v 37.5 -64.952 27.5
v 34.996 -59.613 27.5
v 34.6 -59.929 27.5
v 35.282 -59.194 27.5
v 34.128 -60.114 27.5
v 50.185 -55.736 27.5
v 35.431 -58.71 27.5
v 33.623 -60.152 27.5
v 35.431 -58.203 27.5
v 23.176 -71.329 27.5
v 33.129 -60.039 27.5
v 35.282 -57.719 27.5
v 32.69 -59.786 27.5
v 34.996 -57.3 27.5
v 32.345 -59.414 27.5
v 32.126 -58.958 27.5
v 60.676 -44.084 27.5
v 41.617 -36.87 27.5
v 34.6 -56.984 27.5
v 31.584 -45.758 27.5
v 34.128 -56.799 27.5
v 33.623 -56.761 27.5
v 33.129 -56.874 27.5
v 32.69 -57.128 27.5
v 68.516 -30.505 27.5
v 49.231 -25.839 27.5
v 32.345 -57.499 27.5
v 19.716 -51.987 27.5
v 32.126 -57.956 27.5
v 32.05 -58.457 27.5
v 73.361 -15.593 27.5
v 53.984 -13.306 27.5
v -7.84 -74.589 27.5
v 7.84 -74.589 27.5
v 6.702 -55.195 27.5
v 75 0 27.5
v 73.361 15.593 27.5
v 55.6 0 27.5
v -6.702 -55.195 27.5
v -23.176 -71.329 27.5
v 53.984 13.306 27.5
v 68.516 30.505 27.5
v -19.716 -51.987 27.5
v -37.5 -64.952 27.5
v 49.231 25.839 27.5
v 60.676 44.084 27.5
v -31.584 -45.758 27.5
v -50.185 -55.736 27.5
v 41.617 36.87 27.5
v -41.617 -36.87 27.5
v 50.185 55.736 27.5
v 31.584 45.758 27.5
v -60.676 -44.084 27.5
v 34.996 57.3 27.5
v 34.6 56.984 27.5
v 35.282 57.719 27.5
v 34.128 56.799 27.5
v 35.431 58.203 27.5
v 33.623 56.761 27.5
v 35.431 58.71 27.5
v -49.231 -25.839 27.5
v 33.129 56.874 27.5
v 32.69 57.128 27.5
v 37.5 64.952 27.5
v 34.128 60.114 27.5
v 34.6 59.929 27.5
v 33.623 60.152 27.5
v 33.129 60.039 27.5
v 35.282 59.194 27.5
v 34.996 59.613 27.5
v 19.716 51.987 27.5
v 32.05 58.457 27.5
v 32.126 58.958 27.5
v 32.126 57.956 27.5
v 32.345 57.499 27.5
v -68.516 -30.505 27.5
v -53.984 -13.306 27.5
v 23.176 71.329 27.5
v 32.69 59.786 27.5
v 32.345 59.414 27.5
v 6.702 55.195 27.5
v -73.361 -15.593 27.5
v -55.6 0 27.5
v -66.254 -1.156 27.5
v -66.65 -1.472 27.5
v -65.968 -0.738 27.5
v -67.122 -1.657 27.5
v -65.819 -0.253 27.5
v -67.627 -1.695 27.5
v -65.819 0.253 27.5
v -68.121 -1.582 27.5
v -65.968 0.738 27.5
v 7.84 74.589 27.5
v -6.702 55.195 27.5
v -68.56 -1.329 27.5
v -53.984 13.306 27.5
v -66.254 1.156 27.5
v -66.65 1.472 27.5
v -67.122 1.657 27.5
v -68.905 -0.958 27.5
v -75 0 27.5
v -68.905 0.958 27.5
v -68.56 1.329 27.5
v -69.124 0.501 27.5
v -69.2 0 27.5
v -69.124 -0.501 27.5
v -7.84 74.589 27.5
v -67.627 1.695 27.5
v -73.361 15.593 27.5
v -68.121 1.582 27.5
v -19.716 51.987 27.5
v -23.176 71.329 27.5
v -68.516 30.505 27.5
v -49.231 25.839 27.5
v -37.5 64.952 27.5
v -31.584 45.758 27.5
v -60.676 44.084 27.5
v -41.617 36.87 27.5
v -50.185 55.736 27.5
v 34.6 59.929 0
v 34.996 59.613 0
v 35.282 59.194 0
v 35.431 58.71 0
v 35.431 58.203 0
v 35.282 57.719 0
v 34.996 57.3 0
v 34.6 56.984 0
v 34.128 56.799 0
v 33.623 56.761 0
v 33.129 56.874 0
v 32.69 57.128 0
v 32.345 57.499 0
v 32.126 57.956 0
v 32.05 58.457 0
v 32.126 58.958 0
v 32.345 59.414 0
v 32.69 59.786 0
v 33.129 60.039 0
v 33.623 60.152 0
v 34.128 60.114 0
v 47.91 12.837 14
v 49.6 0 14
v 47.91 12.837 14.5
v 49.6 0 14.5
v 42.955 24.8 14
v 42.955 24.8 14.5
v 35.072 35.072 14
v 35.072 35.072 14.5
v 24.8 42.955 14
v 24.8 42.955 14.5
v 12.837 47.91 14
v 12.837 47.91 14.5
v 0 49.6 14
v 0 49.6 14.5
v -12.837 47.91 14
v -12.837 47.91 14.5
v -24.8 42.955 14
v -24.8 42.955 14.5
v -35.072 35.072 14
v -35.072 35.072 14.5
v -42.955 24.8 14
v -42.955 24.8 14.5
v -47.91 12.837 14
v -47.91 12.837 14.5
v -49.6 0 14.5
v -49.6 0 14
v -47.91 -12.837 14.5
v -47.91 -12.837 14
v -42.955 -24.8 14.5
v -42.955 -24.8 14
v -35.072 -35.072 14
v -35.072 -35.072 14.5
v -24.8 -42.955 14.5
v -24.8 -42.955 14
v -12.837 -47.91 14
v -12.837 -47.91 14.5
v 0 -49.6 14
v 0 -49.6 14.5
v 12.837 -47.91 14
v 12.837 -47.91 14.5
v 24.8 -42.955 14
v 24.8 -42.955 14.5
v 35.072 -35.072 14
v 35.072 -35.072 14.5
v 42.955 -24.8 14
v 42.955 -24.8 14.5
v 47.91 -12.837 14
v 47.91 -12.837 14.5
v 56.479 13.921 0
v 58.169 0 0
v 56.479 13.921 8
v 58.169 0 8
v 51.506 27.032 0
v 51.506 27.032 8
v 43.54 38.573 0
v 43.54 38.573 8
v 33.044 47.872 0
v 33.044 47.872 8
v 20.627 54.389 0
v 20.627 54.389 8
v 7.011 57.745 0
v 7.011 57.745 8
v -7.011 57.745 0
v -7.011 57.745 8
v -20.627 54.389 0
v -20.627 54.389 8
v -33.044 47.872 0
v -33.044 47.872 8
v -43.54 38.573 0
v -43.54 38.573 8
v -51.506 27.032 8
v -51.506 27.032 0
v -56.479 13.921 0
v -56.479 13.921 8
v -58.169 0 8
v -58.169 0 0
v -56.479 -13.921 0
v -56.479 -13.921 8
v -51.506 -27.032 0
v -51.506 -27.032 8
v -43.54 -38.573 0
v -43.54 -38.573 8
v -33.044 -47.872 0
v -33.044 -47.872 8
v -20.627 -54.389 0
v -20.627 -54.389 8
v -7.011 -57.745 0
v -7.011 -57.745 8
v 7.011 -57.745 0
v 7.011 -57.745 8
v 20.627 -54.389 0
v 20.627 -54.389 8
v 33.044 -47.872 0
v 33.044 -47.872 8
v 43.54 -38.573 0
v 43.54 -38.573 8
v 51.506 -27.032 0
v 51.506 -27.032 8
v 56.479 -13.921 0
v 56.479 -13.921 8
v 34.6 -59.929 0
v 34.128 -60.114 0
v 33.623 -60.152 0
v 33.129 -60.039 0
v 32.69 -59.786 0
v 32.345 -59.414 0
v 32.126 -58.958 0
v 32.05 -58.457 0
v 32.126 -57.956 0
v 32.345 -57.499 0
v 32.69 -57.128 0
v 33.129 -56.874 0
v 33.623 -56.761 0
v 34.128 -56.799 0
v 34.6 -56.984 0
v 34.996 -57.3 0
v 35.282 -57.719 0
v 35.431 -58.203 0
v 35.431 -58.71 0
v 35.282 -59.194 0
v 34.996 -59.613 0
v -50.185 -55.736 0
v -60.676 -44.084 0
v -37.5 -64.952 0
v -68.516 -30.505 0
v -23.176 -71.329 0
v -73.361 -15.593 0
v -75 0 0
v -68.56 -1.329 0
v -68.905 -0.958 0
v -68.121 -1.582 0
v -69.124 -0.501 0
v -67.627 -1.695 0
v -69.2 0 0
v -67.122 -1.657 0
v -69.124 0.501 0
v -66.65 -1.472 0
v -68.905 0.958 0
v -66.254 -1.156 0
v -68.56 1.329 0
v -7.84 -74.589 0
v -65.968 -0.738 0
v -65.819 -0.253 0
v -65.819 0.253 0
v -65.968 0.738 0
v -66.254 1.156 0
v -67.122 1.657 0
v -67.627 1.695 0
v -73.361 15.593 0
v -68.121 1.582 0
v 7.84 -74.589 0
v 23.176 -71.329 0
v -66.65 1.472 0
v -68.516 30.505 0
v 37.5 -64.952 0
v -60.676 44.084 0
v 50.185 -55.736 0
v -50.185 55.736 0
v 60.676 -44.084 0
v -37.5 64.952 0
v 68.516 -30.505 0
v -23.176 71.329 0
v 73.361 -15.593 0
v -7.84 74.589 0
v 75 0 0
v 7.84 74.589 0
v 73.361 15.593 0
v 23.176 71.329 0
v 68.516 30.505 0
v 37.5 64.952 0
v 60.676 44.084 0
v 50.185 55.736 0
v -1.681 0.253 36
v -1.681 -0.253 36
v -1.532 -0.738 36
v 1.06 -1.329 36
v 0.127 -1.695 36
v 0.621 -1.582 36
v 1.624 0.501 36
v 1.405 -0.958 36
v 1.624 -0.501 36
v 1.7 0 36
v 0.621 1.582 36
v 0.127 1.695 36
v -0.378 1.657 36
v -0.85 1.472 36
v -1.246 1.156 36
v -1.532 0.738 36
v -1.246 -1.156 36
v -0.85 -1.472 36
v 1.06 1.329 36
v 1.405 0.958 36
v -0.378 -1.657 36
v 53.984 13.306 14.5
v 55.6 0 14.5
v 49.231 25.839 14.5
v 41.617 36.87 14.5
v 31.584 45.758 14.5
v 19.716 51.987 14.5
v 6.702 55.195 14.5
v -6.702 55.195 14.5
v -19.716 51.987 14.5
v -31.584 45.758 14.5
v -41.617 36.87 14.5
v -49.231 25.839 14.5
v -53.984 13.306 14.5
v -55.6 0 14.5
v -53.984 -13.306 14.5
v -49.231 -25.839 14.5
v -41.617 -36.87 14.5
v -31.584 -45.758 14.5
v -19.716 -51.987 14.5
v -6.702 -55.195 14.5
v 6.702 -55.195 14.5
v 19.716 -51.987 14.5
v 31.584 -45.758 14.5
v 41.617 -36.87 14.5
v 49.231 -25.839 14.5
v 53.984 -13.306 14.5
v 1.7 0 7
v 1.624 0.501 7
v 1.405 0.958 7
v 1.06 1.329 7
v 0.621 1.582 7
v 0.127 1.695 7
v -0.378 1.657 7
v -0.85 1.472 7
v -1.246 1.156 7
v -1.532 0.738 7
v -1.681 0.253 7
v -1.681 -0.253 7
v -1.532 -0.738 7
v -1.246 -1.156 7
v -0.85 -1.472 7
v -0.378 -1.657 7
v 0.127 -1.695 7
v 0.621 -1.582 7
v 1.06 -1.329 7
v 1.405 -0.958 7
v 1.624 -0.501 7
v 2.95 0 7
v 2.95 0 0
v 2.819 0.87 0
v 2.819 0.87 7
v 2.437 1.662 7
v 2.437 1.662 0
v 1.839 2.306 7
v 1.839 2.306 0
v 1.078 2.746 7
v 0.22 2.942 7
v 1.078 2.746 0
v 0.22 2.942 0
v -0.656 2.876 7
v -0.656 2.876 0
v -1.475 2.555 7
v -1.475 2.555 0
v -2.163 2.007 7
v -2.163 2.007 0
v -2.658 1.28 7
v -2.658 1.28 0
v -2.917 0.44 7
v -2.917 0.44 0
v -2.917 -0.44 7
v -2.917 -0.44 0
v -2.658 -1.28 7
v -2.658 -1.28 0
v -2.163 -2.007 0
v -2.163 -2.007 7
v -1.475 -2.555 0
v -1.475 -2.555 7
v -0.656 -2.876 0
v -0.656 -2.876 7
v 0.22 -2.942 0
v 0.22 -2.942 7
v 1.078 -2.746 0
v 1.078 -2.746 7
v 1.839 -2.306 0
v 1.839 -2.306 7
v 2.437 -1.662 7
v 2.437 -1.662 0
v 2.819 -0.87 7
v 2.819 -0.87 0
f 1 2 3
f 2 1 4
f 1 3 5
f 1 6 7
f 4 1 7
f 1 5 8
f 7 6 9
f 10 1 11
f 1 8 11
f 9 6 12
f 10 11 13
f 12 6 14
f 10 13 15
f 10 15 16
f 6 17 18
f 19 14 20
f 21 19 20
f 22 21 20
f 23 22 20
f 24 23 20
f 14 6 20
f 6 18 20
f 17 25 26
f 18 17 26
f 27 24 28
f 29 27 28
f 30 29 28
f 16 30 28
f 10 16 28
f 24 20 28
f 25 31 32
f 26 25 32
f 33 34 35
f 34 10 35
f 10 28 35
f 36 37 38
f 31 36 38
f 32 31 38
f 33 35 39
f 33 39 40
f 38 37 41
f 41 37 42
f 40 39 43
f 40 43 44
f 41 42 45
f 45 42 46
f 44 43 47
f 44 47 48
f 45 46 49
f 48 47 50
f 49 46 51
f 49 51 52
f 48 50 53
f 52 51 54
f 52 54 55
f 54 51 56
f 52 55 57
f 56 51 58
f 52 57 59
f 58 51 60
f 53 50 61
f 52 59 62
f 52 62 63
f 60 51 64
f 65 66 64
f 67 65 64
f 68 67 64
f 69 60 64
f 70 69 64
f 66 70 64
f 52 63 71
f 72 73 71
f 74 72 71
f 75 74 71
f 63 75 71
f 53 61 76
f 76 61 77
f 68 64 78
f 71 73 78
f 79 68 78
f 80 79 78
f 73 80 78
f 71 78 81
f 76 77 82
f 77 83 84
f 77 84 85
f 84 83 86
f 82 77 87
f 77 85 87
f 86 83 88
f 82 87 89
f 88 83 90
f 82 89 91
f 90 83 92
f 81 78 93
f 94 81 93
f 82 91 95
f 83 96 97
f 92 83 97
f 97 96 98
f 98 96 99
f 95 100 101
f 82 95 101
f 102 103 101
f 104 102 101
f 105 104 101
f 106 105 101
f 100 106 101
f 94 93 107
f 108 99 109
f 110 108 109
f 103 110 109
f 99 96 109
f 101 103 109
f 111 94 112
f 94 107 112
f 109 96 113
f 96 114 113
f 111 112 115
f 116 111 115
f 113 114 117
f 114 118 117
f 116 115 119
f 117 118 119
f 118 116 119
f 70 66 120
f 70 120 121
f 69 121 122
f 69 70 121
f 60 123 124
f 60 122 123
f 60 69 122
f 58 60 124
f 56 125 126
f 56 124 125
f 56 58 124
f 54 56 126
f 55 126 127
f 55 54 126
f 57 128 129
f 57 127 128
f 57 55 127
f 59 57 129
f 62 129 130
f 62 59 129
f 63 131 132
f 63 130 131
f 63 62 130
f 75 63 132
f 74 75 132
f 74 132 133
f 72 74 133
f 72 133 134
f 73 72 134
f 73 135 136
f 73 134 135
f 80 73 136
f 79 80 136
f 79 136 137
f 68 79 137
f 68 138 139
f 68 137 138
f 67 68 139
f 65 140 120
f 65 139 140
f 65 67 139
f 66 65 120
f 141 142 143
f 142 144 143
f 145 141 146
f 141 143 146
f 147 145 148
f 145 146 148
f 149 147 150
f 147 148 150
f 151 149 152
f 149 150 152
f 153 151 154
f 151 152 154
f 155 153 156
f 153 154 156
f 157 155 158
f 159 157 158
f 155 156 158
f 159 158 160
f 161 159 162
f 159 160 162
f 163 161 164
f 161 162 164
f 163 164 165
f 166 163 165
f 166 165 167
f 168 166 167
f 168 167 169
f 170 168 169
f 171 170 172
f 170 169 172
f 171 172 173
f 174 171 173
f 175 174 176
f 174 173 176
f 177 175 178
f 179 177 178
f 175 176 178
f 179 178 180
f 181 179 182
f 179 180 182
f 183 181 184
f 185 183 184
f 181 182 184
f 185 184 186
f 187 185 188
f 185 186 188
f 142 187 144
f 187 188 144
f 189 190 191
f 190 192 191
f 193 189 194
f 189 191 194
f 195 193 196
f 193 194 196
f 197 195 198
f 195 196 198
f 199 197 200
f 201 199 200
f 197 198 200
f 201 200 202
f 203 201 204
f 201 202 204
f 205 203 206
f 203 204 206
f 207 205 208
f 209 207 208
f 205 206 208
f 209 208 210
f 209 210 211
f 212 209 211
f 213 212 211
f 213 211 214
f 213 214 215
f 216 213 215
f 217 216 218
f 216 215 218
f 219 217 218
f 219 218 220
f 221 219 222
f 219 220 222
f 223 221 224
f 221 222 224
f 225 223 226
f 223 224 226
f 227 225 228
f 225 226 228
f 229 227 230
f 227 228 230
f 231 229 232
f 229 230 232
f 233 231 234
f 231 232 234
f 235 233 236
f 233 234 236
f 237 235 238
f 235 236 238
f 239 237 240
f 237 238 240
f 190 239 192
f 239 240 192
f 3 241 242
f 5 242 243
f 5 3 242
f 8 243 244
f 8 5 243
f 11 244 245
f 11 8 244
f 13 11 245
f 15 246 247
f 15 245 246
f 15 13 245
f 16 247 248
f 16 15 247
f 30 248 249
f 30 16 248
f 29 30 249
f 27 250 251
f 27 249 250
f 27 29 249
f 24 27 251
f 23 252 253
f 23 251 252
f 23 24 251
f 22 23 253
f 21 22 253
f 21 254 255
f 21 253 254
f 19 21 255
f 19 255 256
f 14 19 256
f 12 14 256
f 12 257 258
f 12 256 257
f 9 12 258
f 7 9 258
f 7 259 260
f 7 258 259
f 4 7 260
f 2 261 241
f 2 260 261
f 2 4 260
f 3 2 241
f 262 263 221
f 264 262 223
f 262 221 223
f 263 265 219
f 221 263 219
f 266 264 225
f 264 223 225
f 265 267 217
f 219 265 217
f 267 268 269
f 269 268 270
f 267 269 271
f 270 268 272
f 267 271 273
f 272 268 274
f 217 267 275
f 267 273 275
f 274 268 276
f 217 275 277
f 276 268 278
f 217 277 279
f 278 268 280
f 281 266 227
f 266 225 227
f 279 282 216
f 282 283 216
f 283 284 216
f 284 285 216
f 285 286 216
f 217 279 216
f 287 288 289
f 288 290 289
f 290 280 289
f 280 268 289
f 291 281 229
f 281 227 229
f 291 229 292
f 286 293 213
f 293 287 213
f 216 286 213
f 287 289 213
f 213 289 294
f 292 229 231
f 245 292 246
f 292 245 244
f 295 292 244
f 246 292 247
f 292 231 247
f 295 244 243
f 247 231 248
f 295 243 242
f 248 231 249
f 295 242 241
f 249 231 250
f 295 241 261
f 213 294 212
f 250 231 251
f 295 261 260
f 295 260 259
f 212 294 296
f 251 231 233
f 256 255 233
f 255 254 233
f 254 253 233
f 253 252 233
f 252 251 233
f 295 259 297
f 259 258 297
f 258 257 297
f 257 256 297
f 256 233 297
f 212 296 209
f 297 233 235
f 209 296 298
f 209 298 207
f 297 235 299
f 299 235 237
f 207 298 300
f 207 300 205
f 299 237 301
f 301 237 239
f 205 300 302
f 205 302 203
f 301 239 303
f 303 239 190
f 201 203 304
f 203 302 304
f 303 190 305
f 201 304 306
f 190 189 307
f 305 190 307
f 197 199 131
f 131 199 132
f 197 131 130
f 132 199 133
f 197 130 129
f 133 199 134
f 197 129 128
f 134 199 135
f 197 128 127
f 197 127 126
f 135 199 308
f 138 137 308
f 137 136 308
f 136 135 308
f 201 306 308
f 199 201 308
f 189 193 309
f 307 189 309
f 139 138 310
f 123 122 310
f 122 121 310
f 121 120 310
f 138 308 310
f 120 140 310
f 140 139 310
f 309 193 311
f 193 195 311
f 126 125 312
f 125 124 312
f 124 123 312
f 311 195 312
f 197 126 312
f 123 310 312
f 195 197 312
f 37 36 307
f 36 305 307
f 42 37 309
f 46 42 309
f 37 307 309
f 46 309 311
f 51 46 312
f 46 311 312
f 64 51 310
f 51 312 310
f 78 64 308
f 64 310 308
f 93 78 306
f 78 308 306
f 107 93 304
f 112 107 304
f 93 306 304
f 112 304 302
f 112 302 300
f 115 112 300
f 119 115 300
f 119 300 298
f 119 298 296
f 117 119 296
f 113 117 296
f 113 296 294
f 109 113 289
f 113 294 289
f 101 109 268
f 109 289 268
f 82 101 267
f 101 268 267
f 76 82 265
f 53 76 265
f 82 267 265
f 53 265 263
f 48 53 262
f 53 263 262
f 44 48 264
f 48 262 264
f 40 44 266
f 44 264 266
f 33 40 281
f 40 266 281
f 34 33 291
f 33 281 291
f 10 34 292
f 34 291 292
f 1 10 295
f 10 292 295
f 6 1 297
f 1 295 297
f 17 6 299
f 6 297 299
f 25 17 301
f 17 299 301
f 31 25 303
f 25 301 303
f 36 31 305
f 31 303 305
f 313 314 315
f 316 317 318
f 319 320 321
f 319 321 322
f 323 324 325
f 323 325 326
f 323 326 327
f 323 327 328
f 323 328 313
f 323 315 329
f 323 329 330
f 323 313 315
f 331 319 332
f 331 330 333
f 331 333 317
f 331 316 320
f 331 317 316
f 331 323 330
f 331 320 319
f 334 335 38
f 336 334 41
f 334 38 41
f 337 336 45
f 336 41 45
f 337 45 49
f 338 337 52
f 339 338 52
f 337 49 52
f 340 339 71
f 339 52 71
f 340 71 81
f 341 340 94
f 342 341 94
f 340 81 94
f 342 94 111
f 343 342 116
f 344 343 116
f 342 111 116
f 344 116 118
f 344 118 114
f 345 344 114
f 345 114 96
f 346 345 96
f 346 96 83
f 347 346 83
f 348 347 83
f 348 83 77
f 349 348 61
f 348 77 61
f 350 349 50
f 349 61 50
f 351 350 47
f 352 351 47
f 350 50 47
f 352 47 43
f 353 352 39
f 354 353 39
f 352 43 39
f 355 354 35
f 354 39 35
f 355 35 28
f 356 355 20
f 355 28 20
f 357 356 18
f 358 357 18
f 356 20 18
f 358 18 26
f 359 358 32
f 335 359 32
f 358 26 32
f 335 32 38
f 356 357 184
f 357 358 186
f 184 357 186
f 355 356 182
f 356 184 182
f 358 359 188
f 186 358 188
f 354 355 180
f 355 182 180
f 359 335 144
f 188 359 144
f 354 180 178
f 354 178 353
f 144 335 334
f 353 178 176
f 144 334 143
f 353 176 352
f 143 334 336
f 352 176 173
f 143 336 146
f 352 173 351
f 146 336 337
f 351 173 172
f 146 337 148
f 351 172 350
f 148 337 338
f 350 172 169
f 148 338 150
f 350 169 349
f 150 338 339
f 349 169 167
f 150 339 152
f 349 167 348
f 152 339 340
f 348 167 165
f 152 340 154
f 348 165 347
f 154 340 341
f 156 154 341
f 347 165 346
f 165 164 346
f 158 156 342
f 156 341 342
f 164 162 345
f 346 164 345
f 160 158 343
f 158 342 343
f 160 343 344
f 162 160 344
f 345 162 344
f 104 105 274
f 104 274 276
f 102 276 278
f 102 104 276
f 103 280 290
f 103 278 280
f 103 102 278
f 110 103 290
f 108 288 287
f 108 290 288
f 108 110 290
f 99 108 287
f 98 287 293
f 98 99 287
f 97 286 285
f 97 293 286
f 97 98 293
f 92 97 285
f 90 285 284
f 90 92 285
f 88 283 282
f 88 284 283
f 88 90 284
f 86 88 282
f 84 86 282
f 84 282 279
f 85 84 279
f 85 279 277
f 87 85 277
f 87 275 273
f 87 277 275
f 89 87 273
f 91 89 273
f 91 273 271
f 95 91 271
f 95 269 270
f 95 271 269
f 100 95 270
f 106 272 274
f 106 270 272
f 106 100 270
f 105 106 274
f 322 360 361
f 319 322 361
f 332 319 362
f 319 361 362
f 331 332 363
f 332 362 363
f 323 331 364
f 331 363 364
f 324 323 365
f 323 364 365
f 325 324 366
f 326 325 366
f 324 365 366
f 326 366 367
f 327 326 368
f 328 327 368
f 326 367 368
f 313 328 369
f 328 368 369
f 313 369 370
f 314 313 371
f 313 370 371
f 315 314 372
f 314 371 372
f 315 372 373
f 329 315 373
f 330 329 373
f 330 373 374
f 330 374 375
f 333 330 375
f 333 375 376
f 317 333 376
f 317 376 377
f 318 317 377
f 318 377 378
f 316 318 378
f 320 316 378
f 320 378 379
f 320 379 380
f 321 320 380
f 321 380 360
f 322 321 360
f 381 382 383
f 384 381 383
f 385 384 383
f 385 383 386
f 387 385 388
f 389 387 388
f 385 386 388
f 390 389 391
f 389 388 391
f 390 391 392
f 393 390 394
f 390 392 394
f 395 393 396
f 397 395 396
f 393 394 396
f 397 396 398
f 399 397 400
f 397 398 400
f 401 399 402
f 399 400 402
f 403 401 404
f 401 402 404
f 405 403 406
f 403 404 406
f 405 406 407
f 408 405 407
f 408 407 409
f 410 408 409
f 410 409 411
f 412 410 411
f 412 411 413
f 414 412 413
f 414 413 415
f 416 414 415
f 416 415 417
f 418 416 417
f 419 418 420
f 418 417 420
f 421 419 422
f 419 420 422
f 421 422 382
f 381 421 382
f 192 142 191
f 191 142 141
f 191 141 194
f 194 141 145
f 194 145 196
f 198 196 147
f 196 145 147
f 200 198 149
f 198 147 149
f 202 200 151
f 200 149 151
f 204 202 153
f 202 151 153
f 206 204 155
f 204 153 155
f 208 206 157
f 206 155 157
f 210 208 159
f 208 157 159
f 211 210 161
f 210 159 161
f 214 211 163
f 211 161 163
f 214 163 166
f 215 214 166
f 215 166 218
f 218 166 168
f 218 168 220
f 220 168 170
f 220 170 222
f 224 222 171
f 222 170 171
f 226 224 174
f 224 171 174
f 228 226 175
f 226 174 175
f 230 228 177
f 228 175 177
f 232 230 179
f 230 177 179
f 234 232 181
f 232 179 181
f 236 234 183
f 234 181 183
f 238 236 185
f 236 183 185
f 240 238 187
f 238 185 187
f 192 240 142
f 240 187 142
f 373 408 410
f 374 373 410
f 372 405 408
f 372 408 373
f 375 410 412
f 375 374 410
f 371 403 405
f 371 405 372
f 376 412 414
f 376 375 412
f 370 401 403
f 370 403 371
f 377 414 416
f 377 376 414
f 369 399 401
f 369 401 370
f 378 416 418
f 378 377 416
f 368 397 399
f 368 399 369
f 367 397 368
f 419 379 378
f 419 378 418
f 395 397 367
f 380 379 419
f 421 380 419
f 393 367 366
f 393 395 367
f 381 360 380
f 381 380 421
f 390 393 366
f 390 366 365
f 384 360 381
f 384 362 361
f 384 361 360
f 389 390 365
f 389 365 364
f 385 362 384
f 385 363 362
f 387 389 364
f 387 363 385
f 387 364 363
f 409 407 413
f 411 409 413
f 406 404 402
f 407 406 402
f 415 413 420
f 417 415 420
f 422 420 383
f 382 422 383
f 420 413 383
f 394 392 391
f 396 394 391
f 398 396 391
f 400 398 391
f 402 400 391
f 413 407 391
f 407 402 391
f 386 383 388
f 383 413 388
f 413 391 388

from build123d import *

# Parameters (mm, degrees)
CYLINDER_R               = 2.95
CYLINDER_DEPTH           = 7
CYLINDER001_R            = 1.7
CYLINDER001_DEPTH        = 30
CLONE393_PLACEMENT_ANGLE = 180
ARRAY021_COUNT           = 3


with BuildPart() as m3bolthead:
    # Cylinder → Cylinder (new body)
    with BuildSketch(Plane.XY):
        Circle(CYLINDER_R)
    extrude(amount=CYLINDER_DEPTH)


with BuildPart() as m3bolt:
    # Cylinder001 → Cylinder001 (new body)
    with BuildSketch(Plane.XY.offset(6)):
        Circle(CYLINDER001_R)
    extrude(amount=CYLINDER001_DEPTH)

    # Fusion: union M3BoltHead
    add(m3bolthead.part)


with BuildPart() as array021:
    # Clone393 base: copy of M3Bolt
    add(m3bolt.part)


with BuildPart() as array021_1:
    # Clone393 placement: moved
    add(array021.part.moved(Location((-67.5, 0, 35))).rotate(Axis((-67.5, 0, 35), (0, 1, 0)), CLONE393_PLACEMENT_ANGLE))

    # Array021: Array021 ×3 about axis
    array021_axis = Axis((0, 0, 0), (0, 0, 1))


with BuildPart() as array021_2:
    add(array021_1.part)
    for i in range(1, ARRAY021_COUNT):
        add(array021_1.part.rotate(array021_axis, i * 360 / ARRAY021_COUNT))


with BuildPart() as basetop:
    # Sketch076 → Revolution021 (revolve)
    with BuildSketch(Plane.XZ):
        Polygon((58.168888, 0), (58.168888, 8), (49.6, 14), (49.6, 14.5), (55.6, 14.5), (55.6, 27.5), (75, 27.5), (75, 0), align=None)
    revolve(axis=Axis((0, 0, 0), (0, 0, 1)))

    # Cut128: cut Array021
    add(array021_2.part, mode=Mode.SUBTRACT)


solid = Compound([m3bolt.part, basetop.part])
